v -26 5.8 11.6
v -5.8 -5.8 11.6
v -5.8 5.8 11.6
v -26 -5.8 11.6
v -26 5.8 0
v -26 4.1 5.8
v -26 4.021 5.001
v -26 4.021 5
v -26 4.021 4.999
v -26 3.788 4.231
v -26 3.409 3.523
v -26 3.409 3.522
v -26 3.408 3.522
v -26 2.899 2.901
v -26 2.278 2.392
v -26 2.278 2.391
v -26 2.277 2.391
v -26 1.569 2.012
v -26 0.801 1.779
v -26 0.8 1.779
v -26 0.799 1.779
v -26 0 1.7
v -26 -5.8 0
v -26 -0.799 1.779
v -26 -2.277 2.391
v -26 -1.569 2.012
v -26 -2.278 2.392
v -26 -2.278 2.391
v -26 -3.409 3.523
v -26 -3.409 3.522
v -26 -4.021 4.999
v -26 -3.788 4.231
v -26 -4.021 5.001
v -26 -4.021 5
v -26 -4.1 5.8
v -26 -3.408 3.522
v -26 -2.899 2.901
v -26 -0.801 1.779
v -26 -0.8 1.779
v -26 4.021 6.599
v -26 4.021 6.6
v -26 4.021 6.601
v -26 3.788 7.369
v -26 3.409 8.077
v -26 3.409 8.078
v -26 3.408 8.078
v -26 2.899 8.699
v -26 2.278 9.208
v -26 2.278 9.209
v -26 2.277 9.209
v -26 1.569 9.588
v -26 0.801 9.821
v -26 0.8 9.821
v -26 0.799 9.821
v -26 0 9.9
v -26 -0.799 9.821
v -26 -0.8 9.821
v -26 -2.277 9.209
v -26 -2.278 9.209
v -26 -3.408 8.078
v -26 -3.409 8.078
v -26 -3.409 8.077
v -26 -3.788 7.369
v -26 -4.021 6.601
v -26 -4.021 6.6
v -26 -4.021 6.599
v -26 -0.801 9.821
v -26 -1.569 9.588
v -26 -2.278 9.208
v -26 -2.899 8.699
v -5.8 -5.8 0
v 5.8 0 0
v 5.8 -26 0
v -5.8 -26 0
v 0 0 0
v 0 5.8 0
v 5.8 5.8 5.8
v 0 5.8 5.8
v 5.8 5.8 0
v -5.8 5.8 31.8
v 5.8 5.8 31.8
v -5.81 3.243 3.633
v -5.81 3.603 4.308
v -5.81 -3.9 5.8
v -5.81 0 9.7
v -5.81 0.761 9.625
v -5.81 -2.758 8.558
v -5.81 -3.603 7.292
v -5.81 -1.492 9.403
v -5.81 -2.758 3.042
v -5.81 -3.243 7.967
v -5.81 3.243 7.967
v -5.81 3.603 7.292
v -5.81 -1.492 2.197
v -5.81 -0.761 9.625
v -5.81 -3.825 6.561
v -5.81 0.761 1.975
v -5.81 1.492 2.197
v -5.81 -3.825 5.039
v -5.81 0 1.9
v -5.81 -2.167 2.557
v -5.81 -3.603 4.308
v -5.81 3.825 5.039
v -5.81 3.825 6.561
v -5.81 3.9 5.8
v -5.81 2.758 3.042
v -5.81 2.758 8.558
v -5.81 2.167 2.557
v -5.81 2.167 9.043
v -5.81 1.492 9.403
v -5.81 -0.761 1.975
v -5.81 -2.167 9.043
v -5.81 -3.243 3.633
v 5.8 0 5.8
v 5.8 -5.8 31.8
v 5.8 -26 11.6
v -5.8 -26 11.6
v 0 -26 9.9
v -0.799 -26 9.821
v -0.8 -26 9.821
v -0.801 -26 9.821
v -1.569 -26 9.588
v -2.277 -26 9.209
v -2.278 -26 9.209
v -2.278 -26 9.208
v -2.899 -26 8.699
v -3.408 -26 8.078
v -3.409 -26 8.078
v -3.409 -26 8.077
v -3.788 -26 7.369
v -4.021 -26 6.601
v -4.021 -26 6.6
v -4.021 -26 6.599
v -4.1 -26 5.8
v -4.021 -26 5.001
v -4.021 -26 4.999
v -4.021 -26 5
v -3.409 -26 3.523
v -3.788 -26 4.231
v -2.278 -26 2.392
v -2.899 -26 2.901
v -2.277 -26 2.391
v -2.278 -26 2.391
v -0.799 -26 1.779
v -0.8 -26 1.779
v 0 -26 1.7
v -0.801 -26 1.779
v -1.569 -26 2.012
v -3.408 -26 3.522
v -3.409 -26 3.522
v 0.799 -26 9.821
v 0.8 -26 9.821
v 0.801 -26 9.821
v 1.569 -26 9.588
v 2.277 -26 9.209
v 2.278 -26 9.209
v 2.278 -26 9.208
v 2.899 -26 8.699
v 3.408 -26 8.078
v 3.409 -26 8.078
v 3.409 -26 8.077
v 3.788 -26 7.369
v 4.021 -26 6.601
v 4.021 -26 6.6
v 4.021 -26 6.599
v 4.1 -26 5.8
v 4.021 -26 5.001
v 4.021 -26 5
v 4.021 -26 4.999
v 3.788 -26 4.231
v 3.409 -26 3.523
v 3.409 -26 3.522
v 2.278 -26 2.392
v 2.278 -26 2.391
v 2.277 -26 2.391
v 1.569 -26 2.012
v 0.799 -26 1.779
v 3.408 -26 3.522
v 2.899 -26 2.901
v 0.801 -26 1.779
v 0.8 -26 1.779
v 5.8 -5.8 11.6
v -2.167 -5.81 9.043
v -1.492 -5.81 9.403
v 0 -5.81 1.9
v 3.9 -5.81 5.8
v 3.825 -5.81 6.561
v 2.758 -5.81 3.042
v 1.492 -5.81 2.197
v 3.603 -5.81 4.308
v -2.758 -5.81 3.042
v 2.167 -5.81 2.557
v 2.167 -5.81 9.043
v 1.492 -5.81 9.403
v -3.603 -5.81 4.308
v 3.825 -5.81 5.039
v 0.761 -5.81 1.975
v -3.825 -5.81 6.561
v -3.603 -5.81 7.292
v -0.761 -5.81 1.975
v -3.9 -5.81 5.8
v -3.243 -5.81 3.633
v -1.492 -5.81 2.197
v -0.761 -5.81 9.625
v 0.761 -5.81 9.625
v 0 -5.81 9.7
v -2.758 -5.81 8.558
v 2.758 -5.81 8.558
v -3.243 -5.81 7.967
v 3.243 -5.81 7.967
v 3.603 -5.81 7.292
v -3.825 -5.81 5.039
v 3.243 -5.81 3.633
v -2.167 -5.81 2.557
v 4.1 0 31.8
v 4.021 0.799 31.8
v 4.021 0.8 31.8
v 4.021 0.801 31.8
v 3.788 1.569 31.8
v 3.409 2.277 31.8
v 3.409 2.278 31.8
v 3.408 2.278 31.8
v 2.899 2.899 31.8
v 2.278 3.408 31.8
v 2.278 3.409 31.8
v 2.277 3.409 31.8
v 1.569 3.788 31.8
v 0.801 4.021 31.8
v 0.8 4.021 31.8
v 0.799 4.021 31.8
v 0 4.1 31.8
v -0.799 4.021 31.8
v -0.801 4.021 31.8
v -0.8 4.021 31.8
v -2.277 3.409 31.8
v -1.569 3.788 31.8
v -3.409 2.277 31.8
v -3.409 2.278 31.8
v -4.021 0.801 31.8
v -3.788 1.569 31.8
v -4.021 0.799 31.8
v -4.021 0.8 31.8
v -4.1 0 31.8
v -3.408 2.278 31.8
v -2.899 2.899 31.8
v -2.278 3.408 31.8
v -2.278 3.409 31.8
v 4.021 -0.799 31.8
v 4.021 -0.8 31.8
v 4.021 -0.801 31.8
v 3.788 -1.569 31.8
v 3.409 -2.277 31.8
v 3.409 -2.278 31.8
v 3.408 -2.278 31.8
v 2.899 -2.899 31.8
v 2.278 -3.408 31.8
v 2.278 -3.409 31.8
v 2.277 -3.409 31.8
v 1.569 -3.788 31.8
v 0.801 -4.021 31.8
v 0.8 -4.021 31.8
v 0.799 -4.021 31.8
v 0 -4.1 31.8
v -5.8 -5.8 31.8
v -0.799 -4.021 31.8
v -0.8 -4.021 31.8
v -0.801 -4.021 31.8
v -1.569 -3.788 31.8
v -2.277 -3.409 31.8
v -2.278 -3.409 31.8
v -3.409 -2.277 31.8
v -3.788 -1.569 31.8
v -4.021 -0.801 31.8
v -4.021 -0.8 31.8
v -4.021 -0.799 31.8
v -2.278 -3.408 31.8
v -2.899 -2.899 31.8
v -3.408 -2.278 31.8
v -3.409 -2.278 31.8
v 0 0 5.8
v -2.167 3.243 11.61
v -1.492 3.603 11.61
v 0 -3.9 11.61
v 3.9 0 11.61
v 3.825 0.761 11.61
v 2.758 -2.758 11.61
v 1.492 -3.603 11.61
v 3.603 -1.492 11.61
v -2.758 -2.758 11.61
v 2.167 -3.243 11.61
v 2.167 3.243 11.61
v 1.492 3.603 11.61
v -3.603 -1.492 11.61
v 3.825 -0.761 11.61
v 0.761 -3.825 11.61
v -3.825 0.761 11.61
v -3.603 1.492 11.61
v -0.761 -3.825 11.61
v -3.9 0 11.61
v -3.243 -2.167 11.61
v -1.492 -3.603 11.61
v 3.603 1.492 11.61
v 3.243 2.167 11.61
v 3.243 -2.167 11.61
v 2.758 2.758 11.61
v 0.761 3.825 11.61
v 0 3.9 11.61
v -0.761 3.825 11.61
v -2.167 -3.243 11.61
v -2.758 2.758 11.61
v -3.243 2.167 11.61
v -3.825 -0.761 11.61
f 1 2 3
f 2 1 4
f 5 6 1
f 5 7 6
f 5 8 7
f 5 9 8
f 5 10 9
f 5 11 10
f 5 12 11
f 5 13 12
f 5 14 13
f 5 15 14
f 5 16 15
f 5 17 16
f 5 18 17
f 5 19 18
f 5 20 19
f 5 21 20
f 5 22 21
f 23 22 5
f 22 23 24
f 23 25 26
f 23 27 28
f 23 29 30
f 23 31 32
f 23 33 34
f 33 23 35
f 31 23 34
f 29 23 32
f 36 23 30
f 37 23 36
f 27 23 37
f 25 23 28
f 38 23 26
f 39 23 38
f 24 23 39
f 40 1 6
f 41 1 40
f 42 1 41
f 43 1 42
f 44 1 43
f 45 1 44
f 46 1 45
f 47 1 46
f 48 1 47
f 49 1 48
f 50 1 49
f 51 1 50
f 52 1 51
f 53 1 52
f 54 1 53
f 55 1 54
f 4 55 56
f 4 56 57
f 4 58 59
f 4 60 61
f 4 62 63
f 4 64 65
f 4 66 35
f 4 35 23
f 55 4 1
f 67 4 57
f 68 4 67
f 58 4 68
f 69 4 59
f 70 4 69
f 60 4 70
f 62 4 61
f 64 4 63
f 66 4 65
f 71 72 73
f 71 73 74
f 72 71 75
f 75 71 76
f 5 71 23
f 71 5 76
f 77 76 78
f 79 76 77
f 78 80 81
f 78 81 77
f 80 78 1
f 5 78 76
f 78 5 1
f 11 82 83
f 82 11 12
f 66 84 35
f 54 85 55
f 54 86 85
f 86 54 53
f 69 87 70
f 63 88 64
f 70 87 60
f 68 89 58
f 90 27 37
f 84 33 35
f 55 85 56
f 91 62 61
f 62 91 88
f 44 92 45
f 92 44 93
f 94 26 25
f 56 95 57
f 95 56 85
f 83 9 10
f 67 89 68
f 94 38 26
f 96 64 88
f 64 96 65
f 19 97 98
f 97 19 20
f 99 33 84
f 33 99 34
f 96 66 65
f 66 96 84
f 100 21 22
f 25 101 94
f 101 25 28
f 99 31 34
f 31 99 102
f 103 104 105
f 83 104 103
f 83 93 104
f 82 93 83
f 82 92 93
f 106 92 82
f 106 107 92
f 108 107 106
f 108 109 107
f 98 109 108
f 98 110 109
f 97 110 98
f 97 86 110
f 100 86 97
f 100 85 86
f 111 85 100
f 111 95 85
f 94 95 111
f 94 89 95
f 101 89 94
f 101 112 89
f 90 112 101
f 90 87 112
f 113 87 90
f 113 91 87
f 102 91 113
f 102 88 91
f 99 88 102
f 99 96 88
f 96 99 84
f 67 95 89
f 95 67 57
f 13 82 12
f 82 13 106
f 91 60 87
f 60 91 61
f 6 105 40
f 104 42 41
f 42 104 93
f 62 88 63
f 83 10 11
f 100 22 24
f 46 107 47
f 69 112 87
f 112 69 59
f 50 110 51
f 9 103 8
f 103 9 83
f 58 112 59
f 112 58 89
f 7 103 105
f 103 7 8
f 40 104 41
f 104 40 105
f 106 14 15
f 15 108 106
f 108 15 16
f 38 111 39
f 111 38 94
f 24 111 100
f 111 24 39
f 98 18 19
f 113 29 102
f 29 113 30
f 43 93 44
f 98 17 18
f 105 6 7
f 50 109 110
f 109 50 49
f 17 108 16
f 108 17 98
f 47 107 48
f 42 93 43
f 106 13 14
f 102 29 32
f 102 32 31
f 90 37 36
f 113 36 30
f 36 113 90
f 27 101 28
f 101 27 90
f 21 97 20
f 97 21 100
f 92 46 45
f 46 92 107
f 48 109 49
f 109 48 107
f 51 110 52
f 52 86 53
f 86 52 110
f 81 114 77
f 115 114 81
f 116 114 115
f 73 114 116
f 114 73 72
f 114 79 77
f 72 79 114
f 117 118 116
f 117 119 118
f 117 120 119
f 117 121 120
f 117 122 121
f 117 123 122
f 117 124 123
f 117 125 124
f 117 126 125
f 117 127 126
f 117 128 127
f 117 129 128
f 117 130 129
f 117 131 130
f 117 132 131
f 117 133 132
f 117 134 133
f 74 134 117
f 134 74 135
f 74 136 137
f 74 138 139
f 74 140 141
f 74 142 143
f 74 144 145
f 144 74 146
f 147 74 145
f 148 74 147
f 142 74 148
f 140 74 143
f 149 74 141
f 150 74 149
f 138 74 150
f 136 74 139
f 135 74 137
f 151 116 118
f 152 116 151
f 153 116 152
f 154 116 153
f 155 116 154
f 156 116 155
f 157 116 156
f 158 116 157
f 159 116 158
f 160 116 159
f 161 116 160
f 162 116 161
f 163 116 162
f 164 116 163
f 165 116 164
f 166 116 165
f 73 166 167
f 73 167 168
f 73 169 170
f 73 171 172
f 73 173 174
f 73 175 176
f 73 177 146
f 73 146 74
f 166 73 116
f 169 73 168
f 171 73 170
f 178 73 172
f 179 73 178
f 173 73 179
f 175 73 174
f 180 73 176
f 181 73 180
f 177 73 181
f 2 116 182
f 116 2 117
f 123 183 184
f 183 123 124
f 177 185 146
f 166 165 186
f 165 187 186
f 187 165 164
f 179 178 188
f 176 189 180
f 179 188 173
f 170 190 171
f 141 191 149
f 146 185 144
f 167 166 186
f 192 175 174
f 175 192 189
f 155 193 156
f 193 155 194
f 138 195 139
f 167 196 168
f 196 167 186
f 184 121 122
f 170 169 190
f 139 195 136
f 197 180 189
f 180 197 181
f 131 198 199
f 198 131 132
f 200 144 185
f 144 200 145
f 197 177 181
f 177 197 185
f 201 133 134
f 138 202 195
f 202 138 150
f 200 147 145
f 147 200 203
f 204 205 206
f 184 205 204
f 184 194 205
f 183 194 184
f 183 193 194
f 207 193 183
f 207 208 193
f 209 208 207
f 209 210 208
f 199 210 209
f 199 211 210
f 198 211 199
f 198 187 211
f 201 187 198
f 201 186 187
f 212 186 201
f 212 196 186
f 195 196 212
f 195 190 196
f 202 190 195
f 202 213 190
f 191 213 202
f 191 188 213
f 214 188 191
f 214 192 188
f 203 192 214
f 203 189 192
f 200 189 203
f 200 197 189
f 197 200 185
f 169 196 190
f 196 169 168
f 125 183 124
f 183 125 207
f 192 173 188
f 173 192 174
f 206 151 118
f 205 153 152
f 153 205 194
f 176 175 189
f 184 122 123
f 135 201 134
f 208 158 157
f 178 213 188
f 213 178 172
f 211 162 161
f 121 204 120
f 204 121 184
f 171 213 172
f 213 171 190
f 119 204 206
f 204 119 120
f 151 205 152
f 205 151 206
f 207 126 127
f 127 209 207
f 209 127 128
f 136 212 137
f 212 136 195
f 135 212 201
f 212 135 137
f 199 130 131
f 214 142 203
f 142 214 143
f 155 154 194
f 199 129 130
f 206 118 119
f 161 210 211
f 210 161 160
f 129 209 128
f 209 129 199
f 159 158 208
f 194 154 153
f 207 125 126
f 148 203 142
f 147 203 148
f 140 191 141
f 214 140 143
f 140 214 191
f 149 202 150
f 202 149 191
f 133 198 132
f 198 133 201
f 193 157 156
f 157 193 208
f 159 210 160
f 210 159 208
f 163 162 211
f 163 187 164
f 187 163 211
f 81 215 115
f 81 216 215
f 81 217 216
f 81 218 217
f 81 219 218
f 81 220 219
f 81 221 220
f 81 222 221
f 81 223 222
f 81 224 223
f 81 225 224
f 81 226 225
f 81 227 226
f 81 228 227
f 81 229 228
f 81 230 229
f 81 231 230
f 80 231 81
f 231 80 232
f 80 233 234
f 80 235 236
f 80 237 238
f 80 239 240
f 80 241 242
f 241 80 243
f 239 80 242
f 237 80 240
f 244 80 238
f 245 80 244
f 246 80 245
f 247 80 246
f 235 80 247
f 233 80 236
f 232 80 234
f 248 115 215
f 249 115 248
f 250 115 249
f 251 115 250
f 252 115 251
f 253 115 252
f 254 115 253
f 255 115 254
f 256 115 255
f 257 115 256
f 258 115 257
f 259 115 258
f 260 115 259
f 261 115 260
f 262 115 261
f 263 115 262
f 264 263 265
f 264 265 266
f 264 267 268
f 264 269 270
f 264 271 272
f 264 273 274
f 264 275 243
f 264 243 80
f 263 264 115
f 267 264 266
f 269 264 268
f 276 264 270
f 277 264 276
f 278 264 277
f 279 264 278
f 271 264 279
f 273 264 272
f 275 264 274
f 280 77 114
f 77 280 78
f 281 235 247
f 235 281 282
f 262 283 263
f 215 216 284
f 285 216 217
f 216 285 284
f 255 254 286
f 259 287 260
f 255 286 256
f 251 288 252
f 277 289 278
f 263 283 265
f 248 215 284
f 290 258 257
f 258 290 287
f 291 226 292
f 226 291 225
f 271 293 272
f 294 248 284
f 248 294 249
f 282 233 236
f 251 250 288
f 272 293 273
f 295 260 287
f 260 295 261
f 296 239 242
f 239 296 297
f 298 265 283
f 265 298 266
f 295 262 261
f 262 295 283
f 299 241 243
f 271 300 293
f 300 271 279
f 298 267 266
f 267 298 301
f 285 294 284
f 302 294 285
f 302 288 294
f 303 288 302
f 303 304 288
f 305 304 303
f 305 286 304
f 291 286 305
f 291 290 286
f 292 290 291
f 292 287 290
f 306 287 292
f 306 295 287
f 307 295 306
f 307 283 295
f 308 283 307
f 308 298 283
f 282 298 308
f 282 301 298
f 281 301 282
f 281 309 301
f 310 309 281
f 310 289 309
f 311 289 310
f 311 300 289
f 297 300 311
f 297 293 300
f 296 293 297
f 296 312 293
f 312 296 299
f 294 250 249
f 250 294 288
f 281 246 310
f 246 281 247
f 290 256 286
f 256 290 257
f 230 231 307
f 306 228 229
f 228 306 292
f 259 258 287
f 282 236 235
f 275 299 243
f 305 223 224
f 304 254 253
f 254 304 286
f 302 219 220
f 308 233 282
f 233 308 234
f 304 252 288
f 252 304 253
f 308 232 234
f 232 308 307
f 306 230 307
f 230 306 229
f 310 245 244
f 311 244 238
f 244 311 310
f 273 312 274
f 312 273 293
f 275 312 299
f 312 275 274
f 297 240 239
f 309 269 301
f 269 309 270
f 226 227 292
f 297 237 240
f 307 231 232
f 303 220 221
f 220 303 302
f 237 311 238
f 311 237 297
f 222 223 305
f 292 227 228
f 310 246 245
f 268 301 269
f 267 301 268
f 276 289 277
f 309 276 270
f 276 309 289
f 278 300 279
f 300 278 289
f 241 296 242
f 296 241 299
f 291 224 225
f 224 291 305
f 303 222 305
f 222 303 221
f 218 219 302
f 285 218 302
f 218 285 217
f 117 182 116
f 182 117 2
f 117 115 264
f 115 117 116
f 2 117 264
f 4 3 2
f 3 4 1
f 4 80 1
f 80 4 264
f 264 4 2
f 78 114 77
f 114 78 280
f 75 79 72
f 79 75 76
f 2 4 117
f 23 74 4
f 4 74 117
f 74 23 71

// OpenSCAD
length = 26;
dia = 8;
wall = 1.8;
//cylinder(h = length, r1 = length, r2=0, $fn=4);


/* https://www.reddit.com/r/openscad/comments/3al0m4/copying_and_rotating/ */
module copy_rotate(degrees,vec){
    children();
    rotate(degrees, vec)
    children();
}

/* https://en.wikibooks.org/wiki/OpenSCAD_User_Manual/Primitive_Solids */
module prism(l, w, h){
   polyhedron(
           points=[[0,0,0], [l,0,0], [l,w,0], [0,w,0], [0,w,h], [l,w,h]],
           faces=[[0,1,2,3],[5,4,3,2],[0,4,5,1],[0,3,4],[5,2,1]]
           );
}

module stick_holder() {
  difference() {
    translate([0,0,length/2])
    cube([dia+2*wall, dia+2*wall, length], center=true);  
    
    translate([0,0,dia/2+wall+0.01])
    cylinder(h=length-dia/2-wall+0.01, d1=dia-0.2, d2=dia+0.2, $fn=32);
  }
}


translate([0,0,dia/2+wall])
rotate([0,-90,0])
stick_holder();

translate([0,0,dia/2+wall])
rotate([90,0,0])
stick_holder();

translate([0,0,dia/2+wall])
stick_holder();

cube([dia/2+wall, dia/2+wall, dia/2+wall]);

copy_rotate(-90, [0,0,1])
translate([-dia/2 -wall, -length+dia/2+wall -dia/2 -wall, dia+2*wall])
prism(dia+2*wall, length-dia/2-wall, length-dia/2-wall);

translate([-dia/2-wall, -length+dia/2+wall -dia/2 -wall,0])
rotate([0,-90,0])
prism(dia+2*wall, length-dia/2-wall, length-dia/2-wall);
